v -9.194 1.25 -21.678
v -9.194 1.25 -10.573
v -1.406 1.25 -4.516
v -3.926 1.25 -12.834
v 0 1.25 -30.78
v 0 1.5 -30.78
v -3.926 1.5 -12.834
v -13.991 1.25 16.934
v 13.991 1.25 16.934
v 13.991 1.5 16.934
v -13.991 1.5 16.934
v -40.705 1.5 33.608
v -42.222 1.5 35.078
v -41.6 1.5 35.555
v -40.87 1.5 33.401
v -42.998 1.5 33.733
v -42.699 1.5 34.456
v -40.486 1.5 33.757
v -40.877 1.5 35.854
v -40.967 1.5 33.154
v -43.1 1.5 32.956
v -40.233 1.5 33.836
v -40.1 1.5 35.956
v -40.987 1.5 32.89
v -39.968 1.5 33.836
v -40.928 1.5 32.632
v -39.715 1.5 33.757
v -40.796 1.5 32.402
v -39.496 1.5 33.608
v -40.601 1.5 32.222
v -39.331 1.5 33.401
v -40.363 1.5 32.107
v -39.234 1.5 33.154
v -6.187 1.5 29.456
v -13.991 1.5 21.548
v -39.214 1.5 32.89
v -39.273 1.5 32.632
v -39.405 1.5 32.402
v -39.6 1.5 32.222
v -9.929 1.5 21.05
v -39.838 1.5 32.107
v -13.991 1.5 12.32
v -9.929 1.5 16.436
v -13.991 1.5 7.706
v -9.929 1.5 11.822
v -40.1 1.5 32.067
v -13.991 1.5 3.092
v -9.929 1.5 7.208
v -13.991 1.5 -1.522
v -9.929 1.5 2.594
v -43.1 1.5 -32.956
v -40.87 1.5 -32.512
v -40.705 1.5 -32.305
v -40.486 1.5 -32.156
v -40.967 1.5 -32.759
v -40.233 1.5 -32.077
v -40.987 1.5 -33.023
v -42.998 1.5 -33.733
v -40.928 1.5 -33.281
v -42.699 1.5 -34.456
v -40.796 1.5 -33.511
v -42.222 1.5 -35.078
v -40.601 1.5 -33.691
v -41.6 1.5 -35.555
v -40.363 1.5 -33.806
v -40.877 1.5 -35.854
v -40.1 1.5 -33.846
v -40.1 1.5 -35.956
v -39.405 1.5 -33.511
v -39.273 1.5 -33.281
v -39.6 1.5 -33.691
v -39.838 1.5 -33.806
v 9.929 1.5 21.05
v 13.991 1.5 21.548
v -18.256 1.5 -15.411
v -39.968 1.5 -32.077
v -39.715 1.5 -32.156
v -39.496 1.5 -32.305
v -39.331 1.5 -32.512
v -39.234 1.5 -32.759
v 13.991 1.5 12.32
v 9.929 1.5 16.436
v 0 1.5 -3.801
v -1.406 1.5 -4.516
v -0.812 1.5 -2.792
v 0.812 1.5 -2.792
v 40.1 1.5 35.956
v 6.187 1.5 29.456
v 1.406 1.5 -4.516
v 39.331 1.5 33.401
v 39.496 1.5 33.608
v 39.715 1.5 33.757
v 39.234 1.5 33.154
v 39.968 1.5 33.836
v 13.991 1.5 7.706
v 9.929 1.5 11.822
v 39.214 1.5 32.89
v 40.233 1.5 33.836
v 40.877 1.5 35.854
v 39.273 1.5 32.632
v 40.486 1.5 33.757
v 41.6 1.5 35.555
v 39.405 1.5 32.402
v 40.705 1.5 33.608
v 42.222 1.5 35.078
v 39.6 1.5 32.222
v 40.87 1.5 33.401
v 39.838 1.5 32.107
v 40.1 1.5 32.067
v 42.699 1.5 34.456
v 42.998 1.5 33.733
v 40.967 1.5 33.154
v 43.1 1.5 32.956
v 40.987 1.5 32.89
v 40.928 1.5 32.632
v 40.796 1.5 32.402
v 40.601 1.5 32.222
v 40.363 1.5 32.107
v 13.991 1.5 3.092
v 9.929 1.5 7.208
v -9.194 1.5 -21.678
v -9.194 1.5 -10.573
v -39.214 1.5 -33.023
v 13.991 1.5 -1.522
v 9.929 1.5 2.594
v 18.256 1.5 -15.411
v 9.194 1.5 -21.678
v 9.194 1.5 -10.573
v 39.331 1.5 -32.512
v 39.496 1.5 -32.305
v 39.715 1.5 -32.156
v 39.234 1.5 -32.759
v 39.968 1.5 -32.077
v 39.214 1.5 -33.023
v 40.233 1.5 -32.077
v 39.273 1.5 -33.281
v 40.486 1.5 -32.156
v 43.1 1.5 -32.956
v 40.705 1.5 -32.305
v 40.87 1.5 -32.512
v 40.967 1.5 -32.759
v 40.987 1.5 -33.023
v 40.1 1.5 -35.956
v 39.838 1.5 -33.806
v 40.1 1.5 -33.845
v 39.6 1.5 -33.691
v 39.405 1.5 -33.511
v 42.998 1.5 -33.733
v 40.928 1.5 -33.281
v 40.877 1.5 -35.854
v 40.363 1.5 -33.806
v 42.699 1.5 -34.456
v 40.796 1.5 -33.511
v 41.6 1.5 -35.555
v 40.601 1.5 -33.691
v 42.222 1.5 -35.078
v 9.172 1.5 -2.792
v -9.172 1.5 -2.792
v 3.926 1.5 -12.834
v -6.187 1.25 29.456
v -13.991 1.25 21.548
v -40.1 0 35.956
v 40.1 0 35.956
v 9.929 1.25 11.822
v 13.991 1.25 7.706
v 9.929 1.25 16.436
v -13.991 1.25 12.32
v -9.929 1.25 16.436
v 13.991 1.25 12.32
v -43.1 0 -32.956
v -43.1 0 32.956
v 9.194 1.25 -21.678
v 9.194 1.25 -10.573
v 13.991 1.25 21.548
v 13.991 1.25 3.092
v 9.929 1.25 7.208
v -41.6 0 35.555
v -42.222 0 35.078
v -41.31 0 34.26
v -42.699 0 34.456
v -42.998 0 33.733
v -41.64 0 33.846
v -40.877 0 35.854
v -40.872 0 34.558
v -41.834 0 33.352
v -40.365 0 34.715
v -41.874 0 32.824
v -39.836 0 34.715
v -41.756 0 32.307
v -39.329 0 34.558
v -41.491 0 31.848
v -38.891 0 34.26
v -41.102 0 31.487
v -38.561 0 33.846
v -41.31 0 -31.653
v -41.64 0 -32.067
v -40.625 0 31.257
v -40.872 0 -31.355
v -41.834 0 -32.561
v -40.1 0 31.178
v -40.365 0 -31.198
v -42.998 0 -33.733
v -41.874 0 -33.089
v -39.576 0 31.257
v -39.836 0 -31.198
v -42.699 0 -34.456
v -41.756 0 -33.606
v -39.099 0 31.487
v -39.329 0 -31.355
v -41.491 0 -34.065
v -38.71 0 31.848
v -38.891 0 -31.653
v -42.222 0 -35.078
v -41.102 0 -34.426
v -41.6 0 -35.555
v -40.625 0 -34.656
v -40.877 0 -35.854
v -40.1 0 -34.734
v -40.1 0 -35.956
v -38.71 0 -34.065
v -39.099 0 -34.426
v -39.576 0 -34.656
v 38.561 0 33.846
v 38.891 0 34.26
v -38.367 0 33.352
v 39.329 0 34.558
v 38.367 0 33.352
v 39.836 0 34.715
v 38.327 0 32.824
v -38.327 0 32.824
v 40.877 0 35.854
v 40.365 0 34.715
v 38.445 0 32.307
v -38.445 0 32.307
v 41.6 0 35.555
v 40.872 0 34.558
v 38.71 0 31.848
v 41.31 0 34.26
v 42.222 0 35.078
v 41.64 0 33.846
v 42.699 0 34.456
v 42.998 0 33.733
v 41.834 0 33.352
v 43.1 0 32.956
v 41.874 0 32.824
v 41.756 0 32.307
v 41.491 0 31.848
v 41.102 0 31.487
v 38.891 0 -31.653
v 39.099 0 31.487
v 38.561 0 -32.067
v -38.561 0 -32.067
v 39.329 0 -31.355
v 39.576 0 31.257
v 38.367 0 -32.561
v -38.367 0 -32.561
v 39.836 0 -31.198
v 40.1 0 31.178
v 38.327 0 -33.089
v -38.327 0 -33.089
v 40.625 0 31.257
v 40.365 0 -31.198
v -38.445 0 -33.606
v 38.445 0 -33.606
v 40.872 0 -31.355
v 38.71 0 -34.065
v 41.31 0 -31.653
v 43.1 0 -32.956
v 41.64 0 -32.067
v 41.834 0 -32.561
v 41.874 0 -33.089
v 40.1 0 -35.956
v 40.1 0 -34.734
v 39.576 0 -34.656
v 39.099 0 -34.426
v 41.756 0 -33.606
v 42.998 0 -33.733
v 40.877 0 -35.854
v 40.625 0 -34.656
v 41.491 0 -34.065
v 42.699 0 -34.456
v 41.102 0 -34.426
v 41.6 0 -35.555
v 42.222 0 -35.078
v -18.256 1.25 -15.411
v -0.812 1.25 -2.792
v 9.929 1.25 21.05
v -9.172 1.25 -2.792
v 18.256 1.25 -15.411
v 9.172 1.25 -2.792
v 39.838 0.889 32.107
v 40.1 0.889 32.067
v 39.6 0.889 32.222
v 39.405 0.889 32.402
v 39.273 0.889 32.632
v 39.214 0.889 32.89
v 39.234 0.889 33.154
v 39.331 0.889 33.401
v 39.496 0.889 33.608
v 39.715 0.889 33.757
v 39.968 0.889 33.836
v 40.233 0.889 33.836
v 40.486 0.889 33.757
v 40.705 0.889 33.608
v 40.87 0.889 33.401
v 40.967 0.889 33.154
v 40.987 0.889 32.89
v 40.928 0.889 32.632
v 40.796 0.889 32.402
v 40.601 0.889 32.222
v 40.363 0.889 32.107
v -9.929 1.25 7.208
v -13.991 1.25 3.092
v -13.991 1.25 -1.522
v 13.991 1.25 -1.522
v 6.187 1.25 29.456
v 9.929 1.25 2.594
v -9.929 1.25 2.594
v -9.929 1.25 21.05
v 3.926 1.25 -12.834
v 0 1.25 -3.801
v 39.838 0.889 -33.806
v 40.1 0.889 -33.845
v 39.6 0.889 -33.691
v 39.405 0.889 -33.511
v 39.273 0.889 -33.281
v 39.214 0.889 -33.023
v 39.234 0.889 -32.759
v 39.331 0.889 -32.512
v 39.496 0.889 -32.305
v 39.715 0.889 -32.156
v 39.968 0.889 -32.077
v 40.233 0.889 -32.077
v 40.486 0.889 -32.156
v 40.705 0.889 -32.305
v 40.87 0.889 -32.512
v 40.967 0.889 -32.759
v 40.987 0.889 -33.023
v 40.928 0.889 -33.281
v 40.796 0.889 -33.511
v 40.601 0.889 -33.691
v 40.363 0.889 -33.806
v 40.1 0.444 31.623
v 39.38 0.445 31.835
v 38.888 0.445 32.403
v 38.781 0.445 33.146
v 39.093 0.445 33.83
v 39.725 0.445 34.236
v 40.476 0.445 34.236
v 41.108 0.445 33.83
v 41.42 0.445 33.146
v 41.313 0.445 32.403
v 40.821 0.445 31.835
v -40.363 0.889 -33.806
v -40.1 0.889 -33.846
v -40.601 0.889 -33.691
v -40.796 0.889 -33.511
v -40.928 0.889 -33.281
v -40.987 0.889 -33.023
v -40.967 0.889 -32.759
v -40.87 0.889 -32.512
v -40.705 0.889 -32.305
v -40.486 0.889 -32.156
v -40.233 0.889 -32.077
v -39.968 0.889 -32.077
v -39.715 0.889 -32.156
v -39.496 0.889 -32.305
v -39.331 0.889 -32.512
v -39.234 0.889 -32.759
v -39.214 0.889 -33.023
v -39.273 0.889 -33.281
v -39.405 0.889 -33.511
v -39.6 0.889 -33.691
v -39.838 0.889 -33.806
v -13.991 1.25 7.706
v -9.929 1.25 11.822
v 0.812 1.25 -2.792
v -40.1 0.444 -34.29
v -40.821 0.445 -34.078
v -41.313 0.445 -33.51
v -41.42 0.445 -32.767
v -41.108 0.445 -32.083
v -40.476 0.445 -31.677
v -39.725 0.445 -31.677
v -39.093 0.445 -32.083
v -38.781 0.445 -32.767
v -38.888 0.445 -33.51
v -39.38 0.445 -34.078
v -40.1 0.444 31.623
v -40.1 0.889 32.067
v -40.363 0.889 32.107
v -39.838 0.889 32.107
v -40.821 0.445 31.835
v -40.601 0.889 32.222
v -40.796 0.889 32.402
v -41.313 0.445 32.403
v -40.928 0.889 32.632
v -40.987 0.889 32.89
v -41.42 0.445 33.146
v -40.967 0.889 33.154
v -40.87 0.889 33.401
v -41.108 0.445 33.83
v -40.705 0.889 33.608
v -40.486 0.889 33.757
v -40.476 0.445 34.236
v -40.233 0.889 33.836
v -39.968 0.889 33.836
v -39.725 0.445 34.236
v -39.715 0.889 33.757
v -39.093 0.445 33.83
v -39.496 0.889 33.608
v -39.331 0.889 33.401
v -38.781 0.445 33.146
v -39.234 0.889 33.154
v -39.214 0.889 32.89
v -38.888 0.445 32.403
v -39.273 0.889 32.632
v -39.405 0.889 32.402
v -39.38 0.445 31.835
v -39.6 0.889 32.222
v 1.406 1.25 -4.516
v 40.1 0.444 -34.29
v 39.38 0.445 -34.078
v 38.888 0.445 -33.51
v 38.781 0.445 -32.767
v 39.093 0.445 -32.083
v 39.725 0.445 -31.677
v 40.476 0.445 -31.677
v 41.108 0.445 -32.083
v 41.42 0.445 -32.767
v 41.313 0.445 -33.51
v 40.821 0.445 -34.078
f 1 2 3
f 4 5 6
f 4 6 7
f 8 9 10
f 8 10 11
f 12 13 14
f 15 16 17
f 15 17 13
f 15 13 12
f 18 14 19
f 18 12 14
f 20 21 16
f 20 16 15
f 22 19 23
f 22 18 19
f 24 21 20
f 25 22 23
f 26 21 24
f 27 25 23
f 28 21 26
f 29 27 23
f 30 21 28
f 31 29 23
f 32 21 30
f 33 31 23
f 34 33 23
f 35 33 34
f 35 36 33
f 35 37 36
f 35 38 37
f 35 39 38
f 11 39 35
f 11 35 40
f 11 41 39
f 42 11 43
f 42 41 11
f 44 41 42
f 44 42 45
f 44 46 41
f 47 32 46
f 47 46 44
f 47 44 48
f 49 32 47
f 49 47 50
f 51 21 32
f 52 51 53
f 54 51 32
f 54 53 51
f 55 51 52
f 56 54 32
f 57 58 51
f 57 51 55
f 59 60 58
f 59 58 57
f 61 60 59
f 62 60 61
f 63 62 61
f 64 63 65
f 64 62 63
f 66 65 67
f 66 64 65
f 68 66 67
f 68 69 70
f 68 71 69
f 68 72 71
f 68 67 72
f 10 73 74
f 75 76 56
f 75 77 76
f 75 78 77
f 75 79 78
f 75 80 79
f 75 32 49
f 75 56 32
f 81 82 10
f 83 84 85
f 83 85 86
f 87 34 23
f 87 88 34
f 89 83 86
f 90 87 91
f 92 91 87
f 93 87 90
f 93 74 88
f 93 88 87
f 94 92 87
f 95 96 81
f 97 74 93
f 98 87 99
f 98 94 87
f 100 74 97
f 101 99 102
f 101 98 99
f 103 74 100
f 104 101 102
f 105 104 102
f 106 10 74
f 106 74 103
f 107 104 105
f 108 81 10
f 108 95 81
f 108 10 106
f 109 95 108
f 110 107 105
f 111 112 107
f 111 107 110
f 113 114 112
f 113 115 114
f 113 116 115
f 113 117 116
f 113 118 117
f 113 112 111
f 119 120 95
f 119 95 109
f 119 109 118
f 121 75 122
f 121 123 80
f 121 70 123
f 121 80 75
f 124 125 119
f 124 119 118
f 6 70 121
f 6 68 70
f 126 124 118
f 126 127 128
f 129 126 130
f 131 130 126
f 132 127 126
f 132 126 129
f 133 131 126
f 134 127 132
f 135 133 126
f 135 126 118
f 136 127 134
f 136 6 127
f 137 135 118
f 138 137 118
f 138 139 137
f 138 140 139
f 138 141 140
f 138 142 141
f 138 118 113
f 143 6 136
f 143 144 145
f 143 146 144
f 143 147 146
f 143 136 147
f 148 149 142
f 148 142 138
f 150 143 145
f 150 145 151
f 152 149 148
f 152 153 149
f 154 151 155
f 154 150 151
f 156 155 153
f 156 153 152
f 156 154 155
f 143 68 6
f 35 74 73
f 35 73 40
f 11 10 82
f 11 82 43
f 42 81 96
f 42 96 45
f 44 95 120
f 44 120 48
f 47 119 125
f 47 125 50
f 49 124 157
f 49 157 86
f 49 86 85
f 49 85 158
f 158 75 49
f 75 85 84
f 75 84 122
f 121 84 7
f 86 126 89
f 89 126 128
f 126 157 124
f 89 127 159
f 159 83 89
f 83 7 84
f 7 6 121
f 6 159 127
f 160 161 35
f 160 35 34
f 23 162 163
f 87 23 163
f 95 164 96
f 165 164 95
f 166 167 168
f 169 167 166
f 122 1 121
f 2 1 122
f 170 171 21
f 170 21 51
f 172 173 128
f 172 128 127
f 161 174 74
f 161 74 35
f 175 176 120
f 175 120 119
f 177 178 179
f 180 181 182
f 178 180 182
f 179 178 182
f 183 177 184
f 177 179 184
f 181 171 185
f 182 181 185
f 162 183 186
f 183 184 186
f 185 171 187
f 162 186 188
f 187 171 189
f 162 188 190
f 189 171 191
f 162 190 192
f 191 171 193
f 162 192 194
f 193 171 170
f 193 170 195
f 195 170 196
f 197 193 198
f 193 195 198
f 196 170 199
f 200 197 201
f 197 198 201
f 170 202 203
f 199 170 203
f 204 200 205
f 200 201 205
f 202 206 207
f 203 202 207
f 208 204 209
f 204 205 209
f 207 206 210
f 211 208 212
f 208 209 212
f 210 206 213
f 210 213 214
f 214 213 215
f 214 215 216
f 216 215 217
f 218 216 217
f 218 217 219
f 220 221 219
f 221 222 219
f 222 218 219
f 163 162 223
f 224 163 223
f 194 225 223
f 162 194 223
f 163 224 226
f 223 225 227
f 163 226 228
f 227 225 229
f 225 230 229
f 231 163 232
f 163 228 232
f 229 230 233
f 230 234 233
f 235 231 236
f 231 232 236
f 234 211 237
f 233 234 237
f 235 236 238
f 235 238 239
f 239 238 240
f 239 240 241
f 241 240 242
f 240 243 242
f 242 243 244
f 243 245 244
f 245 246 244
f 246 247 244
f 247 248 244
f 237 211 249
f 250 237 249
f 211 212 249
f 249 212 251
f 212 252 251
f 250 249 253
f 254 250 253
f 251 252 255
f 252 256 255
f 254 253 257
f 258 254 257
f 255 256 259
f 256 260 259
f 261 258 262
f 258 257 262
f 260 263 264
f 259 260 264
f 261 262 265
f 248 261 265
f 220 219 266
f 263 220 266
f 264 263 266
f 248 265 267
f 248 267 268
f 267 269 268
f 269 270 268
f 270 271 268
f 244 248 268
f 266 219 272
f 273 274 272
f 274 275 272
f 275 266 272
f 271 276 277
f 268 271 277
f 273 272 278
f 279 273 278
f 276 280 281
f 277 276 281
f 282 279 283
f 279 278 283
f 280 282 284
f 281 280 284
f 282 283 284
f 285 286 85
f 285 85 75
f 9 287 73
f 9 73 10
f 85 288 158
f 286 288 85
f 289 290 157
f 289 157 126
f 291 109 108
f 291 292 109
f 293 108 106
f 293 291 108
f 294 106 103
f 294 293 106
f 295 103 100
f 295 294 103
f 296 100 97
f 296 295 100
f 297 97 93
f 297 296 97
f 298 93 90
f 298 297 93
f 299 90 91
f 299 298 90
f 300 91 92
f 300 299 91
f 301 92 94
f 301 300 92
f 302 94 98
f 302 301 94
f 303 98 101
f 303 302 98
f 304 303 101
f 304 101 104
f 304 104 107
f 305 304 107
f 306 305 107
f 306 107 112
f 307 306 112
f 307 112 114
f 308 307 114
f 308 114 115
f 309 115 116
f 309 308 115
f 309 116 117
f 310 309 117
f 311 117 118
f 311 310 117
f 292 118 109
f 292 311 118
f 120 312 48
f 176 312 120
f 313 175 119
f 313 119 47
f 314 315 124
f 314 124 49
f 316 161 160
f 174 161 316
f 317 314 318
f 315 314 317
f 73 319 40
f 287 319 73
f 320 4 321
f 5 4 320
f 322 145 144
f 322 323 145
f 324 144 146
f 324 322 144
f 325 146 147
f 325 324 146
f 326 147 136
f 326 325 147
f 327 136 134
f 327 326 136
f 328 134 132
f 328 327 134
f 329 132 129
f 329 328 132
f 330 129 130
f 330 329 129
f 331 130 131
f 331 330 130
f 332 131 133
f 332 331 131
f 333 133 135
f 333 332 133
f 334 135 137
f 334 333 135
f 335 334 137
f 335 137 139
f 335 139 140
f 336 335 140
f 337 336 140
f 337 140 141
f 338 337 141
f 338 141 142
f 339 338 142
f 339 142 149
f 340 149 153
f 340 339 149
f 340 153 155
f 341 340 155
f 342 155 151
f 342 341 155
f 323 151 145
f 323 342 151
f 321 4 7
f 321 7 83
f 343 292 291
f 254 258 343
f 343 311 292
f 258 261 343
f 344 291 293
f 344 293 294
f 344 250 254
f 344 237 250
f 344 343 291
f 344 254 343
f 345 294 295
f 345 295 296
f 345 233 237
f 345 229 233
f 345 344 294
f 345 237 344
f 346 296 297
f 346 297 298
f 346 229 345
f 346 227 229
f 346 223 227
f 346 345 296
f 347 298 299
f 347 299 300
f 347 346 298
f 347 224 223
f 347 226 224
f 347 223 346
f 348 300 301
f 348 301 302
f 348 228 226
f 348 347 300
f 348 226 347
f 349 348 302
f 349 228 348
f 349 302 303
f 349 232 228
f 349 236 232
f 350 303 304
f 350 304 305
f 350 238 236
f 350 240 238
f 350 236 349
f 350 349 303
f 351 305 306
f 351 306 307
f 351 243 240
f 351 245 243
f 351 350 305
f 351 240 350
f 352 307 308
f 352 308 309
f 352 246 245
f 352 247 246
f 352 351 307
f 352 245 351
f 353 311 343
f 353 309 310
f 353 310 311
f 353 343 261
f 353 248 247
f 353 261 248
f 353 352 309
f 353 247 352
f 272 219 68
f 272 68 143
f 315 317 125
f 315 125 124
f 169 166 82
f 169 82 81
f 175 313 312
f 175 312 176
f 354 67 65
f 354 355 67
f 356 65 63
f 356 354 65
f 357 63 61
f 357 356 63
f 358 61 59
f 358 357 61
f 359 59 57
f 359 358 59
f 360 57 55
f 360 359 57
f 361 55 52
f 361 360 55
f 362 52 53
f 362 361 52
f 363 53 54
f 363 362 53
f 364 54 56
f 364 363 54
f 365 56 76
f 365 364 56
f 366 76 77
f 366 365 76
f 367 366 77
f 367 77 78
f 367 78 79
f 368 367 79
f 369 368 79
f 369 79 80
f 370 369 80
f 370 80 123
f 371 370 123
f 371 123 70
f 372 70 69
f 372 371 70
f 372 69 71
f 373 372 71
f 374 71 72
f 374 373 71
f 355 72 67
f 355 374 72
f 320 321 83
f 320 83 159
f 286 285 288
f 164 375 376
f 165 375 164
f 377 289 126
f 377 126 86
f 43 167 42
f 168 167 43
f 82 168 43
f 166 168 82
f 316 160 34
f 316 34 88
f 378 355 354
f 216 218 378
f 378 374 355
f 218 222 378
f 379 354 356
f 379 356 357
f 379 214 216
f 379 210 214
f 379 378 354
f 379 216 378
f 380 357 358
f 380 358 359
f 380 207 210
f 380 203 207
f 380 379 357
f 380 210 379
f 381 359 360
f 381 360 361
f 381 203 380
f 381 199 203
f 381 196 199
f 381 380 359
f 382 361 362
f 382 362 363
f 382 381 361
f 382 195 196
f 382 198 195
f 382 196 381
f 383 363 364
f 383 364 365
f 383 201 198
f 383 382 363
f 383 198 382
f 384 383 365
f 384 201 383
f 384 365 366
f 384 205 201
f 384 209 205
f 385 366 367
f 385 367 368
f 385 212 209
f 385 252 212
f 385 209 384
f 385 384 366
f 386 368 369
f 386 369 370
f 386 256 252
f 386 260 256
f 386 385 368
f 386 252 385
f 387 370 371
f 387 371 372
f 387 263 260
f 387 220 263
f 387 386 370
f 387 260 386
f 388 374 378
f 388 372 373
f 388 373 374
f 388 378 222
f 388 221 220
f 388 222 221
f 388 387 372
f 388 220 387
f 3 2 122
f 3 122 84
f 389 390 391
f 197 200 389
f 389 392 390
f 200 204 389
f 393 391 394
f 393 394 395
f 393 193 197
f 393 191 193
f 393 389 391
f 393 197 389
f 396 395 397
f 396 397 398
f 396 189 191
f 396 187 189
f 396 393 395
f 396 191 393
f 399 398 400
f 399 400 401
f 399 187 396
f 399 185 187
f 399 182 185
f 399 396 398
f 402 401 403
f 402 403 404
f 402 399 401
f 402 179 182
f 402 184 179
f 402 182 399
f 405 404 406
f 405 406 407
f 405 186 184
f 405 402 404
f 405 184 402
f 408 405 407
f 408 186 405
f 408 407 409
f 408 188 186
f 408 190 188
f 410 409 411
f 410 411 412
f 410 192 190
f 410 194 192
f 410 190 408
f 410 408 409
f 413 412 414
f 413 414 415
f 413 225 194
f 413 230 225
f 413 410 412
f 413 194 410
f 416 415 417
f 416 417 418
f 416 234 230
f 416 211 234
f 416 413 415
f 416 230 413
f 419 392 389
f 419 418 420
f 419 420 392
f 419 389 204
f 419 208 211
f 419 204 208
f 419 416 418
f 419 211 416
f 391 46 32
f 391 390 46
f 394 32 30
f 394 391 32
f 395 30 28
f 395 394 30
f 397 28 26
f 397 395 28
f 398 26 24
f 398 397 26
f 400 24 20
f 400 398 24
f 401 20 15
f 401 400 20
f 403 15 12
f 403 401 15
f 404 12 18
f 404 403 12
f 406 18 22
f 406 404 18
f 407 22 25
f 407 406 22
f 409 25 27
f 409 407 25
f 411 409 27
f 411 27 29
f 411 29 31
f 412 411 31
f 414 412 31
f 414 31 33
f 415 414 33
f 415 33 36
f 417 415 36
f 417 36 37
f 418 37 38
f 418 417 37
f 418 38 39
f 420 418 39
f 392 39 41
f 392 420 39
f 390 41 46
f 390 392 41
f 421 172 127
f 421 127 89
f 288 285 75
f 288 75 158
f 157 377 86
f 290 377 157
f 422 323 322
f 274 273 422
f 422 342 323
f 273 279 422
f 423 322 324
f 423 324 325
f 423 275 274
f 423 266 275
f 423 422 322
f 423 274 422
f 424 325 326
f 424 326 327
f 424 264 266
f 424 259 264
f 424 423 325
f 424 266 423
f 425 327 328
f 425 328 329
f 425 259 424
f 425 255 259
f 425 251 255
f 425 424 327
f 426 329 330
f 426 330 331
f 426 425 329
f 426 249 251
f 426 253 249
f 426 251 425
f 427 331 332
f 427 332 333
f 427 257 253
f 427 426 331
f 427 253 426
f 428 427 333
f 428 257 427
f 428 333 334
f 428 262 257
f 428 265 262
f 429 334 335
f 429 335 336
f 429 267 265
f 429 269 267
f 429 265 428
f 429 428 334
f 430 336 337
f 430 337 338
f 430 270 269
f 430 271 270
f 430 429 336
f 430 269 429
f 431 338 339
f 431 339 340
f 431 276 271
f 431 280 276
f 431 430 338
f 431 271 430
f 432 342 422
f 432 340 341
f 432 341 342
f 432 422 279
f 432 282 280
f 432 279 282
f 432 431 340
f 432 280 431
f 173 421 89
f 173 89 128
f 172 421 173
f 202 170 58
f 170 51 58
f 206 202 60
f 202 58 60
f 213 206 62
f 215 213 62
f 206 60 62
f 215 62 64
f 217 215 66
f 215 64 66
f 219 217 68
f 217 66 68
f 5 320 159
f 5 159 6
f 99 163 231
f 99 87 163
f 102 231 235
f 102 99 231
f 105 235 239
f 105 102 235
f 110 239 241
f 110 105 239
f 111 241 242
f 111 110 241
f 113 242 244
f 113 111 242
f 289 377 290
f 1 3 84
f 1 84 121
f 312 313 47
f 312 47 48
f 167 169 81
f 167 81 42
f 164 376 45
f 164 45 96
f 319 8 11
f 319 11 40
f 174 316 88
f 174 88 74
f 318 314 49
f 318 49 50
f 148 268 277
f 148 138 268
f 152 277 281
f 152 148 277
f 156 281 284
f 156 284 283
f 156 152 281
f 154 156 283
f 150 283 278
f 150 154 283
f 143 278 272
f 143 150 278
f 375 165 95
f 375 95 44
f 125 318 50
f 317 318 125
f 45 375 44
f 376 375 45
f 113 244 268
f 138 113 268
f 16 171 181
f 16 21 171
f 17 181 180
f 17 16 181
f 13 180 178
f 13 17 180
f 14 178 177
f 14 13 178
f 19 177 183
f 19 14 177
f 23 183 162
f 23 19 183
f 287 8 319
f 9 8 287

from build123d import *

# Parameters (mm, degrees)
SKETCH1_W                      = 86.201
SKETCH1_H                      = 71.913
BOSS_EXTRUDE1_DEPTH            = 1.5
FILLET1_R                      = 3
F_2_56_TAPPED_HOLE1_AT_2_COUNT = 2
F_2_56_TAPPED_HOLE1_AT_2_PITCH = 80.201
F_2_56_TAPPED_HOLE1_AT_3_COUNT = 2
F_2_56_TAPPED_HOLE1_AT_3_PITCH = 103.811001199
F_2_56_TAPPED_HOLE1_AT_4_COUNT = 2
F_2_56_TAPPED_HOLE1_AT_4_PITCH = 65.913
CUT_EXTRUDE1_START             = -0.25
CUT_EXTRUDE1_DEPTH             = 0.25


# Read off the part's stored shape, not the designer's step: Cut-Extrude1
with BuildPart() as part:
    # Sketch1 → Boss-Extrude1 (new body)
    with BuildSketch(Plane(origin=(0, 0, 0), x_dir=(1, 0, 0), z_dir=(0, 1, 0))):
        Rectangle(SKETCH1_W, SKETCH1_H)
    extrude(amount=BOSS_EXTRUDE1_DEPTH)

    # Fillet1
    fillet1_edges = [part.edges().sort_by_distance(p)[0] for p in [
        (43.1005, 0.75, 35.9565),
        (-43.1005, 0.75, 35.9565),
        (-43.1005, 0.75, -35.9565),
        (43.1005, 0.75, -35.9565),
    ]]
    fillet(fillet1_edges, radius=FILLET1_R)

    # Sketch4 → #2-56 Tapped Hole1 (revolve, cut)
    with BuildSketch(Plane(origin=(-40.1005, 0, 32.9565), x_dir=(0, 0, -1), z_dir=(1, 0, 0))):
        Polygon((0, 0), (0, 1.5), (0.889, 1.5), (0.889, 0.889), (1.778, 0), align=None)
    f_2_56_tapped_hole1 = revolve(axis=Axis((-40.1005, -6.35, 32.9565), (0, 1, 0)), mode=Mode.SUBTRACT)

    # #2-56 Tapped Hole1 at 2: #2-56 Tapped Hole1 ×2
    with Locations(*[(i * F_2_56_TAPPED_HOLE1_AT_2_PITCH, 0, 0) for i in range(1, F_2_56_TAPPED_HOLE1_AT_2_COUNT)]):
        add(f_2_56_tapped_hole1, mode=Mode.SUBTRACT)

    # #2-56 Tapped Hole1 at 3: #2-56 Tapped Hole1 ×2
    with Locations(*[Vector(0.7725674453907951, 0, -0.634932706924396) * (i * F_2_56_TAPPED_HOLE1_AT_3_PITCH) for i in range(1, F_2_56_TAPPED_HOLE1_AT_3_COUNT)]):
        add(f_2_56_tapped_hole1, mode=Mode.SUBTRACT)

    # #2-56 Tapped Hole1 at 4: #2-56 Tapped Hole1 ×2
    with Locations(*[(0, 0, -i * F_2_56_TAPPED_HOLE1_AT_4_PITCH) for i in range(1, F_2_56_TAPPED_HOLE1_AT_4_COUNT)]):
        add(f_2_56_tapped_hole1, mode=Mode.SUBTRACT)

    # Cut-Extrude1 outline → Cut-Extrude1 (cut)
    with BuildSketch(Plane(origin=(0, 1.5, 0), x_dir=(1, 0, 0), z_dir=(0, 1, 0)).offset(CUT_EXTRUDE1_START)):
        Polygon((-13.990667708, -16.934130724), (-9.929224496, -21.049984667), (9.929227007, -21.049984667), (13.990670219, -16.934130724), align=None)
        Polygon((-18.255824334, 15.410771968), (-9.171914583, 2.791562203), (-0.811527801, 2.791562203), align=None)
        Polygon((18.255804305, 15.410771968), (0.811507772, 2.791562203), (9.171894554, 2.791562203), align=None)
        Polygon((-9.194466068, 10.573407227), (-1.405683839, 4.516178709), (-9.194466068, 21.678326178), align=None)
        Polygon((-13.990667708, -12.320150377), (-9.929224496, -16.436026859), (9.929227007, -16.436026859), (13.990670219, -12.320150377), align=None)
        Polygon((-13.990667708, -7.70619257), (-9.929201956, -11.822069052), (9.929204467, -11.822069052), (13.990670219, -7.70619257), align=None)
        Polygon((-13.990667708, -3.092234762), (-9.929224496, -7.208088705), (9.929227007, -7.208088705), (13.990670219, -3.092234762), align=None)
        Polygon((-13.990667708, 1.521745585), (-9.929224496, -2.594130897), (9.929227007, -2.594130897), (13.990670219, 1.521745585), align=None)
        Polygon((0, 3.801099501), (3.926067099, 12.833705067), (0, 30.78030555), (-3.926067099, 12.833705067), align=None)
        Polygon((1.405683839, 4.516178709), (9.194466068, 10.573407227), (9.194466068, 21.678326178), align=None)
        Polygon((-6.186825635, -29.4565), (6.186825635, -29.4565), (13.990662514, -21.548093926), (-13.990662514, -21.548093926), align=None)
    extrude(amount=CUT_EXTRUDE1_DEPTH, mode=Mode.SUBTRACT)


solid = part.part
